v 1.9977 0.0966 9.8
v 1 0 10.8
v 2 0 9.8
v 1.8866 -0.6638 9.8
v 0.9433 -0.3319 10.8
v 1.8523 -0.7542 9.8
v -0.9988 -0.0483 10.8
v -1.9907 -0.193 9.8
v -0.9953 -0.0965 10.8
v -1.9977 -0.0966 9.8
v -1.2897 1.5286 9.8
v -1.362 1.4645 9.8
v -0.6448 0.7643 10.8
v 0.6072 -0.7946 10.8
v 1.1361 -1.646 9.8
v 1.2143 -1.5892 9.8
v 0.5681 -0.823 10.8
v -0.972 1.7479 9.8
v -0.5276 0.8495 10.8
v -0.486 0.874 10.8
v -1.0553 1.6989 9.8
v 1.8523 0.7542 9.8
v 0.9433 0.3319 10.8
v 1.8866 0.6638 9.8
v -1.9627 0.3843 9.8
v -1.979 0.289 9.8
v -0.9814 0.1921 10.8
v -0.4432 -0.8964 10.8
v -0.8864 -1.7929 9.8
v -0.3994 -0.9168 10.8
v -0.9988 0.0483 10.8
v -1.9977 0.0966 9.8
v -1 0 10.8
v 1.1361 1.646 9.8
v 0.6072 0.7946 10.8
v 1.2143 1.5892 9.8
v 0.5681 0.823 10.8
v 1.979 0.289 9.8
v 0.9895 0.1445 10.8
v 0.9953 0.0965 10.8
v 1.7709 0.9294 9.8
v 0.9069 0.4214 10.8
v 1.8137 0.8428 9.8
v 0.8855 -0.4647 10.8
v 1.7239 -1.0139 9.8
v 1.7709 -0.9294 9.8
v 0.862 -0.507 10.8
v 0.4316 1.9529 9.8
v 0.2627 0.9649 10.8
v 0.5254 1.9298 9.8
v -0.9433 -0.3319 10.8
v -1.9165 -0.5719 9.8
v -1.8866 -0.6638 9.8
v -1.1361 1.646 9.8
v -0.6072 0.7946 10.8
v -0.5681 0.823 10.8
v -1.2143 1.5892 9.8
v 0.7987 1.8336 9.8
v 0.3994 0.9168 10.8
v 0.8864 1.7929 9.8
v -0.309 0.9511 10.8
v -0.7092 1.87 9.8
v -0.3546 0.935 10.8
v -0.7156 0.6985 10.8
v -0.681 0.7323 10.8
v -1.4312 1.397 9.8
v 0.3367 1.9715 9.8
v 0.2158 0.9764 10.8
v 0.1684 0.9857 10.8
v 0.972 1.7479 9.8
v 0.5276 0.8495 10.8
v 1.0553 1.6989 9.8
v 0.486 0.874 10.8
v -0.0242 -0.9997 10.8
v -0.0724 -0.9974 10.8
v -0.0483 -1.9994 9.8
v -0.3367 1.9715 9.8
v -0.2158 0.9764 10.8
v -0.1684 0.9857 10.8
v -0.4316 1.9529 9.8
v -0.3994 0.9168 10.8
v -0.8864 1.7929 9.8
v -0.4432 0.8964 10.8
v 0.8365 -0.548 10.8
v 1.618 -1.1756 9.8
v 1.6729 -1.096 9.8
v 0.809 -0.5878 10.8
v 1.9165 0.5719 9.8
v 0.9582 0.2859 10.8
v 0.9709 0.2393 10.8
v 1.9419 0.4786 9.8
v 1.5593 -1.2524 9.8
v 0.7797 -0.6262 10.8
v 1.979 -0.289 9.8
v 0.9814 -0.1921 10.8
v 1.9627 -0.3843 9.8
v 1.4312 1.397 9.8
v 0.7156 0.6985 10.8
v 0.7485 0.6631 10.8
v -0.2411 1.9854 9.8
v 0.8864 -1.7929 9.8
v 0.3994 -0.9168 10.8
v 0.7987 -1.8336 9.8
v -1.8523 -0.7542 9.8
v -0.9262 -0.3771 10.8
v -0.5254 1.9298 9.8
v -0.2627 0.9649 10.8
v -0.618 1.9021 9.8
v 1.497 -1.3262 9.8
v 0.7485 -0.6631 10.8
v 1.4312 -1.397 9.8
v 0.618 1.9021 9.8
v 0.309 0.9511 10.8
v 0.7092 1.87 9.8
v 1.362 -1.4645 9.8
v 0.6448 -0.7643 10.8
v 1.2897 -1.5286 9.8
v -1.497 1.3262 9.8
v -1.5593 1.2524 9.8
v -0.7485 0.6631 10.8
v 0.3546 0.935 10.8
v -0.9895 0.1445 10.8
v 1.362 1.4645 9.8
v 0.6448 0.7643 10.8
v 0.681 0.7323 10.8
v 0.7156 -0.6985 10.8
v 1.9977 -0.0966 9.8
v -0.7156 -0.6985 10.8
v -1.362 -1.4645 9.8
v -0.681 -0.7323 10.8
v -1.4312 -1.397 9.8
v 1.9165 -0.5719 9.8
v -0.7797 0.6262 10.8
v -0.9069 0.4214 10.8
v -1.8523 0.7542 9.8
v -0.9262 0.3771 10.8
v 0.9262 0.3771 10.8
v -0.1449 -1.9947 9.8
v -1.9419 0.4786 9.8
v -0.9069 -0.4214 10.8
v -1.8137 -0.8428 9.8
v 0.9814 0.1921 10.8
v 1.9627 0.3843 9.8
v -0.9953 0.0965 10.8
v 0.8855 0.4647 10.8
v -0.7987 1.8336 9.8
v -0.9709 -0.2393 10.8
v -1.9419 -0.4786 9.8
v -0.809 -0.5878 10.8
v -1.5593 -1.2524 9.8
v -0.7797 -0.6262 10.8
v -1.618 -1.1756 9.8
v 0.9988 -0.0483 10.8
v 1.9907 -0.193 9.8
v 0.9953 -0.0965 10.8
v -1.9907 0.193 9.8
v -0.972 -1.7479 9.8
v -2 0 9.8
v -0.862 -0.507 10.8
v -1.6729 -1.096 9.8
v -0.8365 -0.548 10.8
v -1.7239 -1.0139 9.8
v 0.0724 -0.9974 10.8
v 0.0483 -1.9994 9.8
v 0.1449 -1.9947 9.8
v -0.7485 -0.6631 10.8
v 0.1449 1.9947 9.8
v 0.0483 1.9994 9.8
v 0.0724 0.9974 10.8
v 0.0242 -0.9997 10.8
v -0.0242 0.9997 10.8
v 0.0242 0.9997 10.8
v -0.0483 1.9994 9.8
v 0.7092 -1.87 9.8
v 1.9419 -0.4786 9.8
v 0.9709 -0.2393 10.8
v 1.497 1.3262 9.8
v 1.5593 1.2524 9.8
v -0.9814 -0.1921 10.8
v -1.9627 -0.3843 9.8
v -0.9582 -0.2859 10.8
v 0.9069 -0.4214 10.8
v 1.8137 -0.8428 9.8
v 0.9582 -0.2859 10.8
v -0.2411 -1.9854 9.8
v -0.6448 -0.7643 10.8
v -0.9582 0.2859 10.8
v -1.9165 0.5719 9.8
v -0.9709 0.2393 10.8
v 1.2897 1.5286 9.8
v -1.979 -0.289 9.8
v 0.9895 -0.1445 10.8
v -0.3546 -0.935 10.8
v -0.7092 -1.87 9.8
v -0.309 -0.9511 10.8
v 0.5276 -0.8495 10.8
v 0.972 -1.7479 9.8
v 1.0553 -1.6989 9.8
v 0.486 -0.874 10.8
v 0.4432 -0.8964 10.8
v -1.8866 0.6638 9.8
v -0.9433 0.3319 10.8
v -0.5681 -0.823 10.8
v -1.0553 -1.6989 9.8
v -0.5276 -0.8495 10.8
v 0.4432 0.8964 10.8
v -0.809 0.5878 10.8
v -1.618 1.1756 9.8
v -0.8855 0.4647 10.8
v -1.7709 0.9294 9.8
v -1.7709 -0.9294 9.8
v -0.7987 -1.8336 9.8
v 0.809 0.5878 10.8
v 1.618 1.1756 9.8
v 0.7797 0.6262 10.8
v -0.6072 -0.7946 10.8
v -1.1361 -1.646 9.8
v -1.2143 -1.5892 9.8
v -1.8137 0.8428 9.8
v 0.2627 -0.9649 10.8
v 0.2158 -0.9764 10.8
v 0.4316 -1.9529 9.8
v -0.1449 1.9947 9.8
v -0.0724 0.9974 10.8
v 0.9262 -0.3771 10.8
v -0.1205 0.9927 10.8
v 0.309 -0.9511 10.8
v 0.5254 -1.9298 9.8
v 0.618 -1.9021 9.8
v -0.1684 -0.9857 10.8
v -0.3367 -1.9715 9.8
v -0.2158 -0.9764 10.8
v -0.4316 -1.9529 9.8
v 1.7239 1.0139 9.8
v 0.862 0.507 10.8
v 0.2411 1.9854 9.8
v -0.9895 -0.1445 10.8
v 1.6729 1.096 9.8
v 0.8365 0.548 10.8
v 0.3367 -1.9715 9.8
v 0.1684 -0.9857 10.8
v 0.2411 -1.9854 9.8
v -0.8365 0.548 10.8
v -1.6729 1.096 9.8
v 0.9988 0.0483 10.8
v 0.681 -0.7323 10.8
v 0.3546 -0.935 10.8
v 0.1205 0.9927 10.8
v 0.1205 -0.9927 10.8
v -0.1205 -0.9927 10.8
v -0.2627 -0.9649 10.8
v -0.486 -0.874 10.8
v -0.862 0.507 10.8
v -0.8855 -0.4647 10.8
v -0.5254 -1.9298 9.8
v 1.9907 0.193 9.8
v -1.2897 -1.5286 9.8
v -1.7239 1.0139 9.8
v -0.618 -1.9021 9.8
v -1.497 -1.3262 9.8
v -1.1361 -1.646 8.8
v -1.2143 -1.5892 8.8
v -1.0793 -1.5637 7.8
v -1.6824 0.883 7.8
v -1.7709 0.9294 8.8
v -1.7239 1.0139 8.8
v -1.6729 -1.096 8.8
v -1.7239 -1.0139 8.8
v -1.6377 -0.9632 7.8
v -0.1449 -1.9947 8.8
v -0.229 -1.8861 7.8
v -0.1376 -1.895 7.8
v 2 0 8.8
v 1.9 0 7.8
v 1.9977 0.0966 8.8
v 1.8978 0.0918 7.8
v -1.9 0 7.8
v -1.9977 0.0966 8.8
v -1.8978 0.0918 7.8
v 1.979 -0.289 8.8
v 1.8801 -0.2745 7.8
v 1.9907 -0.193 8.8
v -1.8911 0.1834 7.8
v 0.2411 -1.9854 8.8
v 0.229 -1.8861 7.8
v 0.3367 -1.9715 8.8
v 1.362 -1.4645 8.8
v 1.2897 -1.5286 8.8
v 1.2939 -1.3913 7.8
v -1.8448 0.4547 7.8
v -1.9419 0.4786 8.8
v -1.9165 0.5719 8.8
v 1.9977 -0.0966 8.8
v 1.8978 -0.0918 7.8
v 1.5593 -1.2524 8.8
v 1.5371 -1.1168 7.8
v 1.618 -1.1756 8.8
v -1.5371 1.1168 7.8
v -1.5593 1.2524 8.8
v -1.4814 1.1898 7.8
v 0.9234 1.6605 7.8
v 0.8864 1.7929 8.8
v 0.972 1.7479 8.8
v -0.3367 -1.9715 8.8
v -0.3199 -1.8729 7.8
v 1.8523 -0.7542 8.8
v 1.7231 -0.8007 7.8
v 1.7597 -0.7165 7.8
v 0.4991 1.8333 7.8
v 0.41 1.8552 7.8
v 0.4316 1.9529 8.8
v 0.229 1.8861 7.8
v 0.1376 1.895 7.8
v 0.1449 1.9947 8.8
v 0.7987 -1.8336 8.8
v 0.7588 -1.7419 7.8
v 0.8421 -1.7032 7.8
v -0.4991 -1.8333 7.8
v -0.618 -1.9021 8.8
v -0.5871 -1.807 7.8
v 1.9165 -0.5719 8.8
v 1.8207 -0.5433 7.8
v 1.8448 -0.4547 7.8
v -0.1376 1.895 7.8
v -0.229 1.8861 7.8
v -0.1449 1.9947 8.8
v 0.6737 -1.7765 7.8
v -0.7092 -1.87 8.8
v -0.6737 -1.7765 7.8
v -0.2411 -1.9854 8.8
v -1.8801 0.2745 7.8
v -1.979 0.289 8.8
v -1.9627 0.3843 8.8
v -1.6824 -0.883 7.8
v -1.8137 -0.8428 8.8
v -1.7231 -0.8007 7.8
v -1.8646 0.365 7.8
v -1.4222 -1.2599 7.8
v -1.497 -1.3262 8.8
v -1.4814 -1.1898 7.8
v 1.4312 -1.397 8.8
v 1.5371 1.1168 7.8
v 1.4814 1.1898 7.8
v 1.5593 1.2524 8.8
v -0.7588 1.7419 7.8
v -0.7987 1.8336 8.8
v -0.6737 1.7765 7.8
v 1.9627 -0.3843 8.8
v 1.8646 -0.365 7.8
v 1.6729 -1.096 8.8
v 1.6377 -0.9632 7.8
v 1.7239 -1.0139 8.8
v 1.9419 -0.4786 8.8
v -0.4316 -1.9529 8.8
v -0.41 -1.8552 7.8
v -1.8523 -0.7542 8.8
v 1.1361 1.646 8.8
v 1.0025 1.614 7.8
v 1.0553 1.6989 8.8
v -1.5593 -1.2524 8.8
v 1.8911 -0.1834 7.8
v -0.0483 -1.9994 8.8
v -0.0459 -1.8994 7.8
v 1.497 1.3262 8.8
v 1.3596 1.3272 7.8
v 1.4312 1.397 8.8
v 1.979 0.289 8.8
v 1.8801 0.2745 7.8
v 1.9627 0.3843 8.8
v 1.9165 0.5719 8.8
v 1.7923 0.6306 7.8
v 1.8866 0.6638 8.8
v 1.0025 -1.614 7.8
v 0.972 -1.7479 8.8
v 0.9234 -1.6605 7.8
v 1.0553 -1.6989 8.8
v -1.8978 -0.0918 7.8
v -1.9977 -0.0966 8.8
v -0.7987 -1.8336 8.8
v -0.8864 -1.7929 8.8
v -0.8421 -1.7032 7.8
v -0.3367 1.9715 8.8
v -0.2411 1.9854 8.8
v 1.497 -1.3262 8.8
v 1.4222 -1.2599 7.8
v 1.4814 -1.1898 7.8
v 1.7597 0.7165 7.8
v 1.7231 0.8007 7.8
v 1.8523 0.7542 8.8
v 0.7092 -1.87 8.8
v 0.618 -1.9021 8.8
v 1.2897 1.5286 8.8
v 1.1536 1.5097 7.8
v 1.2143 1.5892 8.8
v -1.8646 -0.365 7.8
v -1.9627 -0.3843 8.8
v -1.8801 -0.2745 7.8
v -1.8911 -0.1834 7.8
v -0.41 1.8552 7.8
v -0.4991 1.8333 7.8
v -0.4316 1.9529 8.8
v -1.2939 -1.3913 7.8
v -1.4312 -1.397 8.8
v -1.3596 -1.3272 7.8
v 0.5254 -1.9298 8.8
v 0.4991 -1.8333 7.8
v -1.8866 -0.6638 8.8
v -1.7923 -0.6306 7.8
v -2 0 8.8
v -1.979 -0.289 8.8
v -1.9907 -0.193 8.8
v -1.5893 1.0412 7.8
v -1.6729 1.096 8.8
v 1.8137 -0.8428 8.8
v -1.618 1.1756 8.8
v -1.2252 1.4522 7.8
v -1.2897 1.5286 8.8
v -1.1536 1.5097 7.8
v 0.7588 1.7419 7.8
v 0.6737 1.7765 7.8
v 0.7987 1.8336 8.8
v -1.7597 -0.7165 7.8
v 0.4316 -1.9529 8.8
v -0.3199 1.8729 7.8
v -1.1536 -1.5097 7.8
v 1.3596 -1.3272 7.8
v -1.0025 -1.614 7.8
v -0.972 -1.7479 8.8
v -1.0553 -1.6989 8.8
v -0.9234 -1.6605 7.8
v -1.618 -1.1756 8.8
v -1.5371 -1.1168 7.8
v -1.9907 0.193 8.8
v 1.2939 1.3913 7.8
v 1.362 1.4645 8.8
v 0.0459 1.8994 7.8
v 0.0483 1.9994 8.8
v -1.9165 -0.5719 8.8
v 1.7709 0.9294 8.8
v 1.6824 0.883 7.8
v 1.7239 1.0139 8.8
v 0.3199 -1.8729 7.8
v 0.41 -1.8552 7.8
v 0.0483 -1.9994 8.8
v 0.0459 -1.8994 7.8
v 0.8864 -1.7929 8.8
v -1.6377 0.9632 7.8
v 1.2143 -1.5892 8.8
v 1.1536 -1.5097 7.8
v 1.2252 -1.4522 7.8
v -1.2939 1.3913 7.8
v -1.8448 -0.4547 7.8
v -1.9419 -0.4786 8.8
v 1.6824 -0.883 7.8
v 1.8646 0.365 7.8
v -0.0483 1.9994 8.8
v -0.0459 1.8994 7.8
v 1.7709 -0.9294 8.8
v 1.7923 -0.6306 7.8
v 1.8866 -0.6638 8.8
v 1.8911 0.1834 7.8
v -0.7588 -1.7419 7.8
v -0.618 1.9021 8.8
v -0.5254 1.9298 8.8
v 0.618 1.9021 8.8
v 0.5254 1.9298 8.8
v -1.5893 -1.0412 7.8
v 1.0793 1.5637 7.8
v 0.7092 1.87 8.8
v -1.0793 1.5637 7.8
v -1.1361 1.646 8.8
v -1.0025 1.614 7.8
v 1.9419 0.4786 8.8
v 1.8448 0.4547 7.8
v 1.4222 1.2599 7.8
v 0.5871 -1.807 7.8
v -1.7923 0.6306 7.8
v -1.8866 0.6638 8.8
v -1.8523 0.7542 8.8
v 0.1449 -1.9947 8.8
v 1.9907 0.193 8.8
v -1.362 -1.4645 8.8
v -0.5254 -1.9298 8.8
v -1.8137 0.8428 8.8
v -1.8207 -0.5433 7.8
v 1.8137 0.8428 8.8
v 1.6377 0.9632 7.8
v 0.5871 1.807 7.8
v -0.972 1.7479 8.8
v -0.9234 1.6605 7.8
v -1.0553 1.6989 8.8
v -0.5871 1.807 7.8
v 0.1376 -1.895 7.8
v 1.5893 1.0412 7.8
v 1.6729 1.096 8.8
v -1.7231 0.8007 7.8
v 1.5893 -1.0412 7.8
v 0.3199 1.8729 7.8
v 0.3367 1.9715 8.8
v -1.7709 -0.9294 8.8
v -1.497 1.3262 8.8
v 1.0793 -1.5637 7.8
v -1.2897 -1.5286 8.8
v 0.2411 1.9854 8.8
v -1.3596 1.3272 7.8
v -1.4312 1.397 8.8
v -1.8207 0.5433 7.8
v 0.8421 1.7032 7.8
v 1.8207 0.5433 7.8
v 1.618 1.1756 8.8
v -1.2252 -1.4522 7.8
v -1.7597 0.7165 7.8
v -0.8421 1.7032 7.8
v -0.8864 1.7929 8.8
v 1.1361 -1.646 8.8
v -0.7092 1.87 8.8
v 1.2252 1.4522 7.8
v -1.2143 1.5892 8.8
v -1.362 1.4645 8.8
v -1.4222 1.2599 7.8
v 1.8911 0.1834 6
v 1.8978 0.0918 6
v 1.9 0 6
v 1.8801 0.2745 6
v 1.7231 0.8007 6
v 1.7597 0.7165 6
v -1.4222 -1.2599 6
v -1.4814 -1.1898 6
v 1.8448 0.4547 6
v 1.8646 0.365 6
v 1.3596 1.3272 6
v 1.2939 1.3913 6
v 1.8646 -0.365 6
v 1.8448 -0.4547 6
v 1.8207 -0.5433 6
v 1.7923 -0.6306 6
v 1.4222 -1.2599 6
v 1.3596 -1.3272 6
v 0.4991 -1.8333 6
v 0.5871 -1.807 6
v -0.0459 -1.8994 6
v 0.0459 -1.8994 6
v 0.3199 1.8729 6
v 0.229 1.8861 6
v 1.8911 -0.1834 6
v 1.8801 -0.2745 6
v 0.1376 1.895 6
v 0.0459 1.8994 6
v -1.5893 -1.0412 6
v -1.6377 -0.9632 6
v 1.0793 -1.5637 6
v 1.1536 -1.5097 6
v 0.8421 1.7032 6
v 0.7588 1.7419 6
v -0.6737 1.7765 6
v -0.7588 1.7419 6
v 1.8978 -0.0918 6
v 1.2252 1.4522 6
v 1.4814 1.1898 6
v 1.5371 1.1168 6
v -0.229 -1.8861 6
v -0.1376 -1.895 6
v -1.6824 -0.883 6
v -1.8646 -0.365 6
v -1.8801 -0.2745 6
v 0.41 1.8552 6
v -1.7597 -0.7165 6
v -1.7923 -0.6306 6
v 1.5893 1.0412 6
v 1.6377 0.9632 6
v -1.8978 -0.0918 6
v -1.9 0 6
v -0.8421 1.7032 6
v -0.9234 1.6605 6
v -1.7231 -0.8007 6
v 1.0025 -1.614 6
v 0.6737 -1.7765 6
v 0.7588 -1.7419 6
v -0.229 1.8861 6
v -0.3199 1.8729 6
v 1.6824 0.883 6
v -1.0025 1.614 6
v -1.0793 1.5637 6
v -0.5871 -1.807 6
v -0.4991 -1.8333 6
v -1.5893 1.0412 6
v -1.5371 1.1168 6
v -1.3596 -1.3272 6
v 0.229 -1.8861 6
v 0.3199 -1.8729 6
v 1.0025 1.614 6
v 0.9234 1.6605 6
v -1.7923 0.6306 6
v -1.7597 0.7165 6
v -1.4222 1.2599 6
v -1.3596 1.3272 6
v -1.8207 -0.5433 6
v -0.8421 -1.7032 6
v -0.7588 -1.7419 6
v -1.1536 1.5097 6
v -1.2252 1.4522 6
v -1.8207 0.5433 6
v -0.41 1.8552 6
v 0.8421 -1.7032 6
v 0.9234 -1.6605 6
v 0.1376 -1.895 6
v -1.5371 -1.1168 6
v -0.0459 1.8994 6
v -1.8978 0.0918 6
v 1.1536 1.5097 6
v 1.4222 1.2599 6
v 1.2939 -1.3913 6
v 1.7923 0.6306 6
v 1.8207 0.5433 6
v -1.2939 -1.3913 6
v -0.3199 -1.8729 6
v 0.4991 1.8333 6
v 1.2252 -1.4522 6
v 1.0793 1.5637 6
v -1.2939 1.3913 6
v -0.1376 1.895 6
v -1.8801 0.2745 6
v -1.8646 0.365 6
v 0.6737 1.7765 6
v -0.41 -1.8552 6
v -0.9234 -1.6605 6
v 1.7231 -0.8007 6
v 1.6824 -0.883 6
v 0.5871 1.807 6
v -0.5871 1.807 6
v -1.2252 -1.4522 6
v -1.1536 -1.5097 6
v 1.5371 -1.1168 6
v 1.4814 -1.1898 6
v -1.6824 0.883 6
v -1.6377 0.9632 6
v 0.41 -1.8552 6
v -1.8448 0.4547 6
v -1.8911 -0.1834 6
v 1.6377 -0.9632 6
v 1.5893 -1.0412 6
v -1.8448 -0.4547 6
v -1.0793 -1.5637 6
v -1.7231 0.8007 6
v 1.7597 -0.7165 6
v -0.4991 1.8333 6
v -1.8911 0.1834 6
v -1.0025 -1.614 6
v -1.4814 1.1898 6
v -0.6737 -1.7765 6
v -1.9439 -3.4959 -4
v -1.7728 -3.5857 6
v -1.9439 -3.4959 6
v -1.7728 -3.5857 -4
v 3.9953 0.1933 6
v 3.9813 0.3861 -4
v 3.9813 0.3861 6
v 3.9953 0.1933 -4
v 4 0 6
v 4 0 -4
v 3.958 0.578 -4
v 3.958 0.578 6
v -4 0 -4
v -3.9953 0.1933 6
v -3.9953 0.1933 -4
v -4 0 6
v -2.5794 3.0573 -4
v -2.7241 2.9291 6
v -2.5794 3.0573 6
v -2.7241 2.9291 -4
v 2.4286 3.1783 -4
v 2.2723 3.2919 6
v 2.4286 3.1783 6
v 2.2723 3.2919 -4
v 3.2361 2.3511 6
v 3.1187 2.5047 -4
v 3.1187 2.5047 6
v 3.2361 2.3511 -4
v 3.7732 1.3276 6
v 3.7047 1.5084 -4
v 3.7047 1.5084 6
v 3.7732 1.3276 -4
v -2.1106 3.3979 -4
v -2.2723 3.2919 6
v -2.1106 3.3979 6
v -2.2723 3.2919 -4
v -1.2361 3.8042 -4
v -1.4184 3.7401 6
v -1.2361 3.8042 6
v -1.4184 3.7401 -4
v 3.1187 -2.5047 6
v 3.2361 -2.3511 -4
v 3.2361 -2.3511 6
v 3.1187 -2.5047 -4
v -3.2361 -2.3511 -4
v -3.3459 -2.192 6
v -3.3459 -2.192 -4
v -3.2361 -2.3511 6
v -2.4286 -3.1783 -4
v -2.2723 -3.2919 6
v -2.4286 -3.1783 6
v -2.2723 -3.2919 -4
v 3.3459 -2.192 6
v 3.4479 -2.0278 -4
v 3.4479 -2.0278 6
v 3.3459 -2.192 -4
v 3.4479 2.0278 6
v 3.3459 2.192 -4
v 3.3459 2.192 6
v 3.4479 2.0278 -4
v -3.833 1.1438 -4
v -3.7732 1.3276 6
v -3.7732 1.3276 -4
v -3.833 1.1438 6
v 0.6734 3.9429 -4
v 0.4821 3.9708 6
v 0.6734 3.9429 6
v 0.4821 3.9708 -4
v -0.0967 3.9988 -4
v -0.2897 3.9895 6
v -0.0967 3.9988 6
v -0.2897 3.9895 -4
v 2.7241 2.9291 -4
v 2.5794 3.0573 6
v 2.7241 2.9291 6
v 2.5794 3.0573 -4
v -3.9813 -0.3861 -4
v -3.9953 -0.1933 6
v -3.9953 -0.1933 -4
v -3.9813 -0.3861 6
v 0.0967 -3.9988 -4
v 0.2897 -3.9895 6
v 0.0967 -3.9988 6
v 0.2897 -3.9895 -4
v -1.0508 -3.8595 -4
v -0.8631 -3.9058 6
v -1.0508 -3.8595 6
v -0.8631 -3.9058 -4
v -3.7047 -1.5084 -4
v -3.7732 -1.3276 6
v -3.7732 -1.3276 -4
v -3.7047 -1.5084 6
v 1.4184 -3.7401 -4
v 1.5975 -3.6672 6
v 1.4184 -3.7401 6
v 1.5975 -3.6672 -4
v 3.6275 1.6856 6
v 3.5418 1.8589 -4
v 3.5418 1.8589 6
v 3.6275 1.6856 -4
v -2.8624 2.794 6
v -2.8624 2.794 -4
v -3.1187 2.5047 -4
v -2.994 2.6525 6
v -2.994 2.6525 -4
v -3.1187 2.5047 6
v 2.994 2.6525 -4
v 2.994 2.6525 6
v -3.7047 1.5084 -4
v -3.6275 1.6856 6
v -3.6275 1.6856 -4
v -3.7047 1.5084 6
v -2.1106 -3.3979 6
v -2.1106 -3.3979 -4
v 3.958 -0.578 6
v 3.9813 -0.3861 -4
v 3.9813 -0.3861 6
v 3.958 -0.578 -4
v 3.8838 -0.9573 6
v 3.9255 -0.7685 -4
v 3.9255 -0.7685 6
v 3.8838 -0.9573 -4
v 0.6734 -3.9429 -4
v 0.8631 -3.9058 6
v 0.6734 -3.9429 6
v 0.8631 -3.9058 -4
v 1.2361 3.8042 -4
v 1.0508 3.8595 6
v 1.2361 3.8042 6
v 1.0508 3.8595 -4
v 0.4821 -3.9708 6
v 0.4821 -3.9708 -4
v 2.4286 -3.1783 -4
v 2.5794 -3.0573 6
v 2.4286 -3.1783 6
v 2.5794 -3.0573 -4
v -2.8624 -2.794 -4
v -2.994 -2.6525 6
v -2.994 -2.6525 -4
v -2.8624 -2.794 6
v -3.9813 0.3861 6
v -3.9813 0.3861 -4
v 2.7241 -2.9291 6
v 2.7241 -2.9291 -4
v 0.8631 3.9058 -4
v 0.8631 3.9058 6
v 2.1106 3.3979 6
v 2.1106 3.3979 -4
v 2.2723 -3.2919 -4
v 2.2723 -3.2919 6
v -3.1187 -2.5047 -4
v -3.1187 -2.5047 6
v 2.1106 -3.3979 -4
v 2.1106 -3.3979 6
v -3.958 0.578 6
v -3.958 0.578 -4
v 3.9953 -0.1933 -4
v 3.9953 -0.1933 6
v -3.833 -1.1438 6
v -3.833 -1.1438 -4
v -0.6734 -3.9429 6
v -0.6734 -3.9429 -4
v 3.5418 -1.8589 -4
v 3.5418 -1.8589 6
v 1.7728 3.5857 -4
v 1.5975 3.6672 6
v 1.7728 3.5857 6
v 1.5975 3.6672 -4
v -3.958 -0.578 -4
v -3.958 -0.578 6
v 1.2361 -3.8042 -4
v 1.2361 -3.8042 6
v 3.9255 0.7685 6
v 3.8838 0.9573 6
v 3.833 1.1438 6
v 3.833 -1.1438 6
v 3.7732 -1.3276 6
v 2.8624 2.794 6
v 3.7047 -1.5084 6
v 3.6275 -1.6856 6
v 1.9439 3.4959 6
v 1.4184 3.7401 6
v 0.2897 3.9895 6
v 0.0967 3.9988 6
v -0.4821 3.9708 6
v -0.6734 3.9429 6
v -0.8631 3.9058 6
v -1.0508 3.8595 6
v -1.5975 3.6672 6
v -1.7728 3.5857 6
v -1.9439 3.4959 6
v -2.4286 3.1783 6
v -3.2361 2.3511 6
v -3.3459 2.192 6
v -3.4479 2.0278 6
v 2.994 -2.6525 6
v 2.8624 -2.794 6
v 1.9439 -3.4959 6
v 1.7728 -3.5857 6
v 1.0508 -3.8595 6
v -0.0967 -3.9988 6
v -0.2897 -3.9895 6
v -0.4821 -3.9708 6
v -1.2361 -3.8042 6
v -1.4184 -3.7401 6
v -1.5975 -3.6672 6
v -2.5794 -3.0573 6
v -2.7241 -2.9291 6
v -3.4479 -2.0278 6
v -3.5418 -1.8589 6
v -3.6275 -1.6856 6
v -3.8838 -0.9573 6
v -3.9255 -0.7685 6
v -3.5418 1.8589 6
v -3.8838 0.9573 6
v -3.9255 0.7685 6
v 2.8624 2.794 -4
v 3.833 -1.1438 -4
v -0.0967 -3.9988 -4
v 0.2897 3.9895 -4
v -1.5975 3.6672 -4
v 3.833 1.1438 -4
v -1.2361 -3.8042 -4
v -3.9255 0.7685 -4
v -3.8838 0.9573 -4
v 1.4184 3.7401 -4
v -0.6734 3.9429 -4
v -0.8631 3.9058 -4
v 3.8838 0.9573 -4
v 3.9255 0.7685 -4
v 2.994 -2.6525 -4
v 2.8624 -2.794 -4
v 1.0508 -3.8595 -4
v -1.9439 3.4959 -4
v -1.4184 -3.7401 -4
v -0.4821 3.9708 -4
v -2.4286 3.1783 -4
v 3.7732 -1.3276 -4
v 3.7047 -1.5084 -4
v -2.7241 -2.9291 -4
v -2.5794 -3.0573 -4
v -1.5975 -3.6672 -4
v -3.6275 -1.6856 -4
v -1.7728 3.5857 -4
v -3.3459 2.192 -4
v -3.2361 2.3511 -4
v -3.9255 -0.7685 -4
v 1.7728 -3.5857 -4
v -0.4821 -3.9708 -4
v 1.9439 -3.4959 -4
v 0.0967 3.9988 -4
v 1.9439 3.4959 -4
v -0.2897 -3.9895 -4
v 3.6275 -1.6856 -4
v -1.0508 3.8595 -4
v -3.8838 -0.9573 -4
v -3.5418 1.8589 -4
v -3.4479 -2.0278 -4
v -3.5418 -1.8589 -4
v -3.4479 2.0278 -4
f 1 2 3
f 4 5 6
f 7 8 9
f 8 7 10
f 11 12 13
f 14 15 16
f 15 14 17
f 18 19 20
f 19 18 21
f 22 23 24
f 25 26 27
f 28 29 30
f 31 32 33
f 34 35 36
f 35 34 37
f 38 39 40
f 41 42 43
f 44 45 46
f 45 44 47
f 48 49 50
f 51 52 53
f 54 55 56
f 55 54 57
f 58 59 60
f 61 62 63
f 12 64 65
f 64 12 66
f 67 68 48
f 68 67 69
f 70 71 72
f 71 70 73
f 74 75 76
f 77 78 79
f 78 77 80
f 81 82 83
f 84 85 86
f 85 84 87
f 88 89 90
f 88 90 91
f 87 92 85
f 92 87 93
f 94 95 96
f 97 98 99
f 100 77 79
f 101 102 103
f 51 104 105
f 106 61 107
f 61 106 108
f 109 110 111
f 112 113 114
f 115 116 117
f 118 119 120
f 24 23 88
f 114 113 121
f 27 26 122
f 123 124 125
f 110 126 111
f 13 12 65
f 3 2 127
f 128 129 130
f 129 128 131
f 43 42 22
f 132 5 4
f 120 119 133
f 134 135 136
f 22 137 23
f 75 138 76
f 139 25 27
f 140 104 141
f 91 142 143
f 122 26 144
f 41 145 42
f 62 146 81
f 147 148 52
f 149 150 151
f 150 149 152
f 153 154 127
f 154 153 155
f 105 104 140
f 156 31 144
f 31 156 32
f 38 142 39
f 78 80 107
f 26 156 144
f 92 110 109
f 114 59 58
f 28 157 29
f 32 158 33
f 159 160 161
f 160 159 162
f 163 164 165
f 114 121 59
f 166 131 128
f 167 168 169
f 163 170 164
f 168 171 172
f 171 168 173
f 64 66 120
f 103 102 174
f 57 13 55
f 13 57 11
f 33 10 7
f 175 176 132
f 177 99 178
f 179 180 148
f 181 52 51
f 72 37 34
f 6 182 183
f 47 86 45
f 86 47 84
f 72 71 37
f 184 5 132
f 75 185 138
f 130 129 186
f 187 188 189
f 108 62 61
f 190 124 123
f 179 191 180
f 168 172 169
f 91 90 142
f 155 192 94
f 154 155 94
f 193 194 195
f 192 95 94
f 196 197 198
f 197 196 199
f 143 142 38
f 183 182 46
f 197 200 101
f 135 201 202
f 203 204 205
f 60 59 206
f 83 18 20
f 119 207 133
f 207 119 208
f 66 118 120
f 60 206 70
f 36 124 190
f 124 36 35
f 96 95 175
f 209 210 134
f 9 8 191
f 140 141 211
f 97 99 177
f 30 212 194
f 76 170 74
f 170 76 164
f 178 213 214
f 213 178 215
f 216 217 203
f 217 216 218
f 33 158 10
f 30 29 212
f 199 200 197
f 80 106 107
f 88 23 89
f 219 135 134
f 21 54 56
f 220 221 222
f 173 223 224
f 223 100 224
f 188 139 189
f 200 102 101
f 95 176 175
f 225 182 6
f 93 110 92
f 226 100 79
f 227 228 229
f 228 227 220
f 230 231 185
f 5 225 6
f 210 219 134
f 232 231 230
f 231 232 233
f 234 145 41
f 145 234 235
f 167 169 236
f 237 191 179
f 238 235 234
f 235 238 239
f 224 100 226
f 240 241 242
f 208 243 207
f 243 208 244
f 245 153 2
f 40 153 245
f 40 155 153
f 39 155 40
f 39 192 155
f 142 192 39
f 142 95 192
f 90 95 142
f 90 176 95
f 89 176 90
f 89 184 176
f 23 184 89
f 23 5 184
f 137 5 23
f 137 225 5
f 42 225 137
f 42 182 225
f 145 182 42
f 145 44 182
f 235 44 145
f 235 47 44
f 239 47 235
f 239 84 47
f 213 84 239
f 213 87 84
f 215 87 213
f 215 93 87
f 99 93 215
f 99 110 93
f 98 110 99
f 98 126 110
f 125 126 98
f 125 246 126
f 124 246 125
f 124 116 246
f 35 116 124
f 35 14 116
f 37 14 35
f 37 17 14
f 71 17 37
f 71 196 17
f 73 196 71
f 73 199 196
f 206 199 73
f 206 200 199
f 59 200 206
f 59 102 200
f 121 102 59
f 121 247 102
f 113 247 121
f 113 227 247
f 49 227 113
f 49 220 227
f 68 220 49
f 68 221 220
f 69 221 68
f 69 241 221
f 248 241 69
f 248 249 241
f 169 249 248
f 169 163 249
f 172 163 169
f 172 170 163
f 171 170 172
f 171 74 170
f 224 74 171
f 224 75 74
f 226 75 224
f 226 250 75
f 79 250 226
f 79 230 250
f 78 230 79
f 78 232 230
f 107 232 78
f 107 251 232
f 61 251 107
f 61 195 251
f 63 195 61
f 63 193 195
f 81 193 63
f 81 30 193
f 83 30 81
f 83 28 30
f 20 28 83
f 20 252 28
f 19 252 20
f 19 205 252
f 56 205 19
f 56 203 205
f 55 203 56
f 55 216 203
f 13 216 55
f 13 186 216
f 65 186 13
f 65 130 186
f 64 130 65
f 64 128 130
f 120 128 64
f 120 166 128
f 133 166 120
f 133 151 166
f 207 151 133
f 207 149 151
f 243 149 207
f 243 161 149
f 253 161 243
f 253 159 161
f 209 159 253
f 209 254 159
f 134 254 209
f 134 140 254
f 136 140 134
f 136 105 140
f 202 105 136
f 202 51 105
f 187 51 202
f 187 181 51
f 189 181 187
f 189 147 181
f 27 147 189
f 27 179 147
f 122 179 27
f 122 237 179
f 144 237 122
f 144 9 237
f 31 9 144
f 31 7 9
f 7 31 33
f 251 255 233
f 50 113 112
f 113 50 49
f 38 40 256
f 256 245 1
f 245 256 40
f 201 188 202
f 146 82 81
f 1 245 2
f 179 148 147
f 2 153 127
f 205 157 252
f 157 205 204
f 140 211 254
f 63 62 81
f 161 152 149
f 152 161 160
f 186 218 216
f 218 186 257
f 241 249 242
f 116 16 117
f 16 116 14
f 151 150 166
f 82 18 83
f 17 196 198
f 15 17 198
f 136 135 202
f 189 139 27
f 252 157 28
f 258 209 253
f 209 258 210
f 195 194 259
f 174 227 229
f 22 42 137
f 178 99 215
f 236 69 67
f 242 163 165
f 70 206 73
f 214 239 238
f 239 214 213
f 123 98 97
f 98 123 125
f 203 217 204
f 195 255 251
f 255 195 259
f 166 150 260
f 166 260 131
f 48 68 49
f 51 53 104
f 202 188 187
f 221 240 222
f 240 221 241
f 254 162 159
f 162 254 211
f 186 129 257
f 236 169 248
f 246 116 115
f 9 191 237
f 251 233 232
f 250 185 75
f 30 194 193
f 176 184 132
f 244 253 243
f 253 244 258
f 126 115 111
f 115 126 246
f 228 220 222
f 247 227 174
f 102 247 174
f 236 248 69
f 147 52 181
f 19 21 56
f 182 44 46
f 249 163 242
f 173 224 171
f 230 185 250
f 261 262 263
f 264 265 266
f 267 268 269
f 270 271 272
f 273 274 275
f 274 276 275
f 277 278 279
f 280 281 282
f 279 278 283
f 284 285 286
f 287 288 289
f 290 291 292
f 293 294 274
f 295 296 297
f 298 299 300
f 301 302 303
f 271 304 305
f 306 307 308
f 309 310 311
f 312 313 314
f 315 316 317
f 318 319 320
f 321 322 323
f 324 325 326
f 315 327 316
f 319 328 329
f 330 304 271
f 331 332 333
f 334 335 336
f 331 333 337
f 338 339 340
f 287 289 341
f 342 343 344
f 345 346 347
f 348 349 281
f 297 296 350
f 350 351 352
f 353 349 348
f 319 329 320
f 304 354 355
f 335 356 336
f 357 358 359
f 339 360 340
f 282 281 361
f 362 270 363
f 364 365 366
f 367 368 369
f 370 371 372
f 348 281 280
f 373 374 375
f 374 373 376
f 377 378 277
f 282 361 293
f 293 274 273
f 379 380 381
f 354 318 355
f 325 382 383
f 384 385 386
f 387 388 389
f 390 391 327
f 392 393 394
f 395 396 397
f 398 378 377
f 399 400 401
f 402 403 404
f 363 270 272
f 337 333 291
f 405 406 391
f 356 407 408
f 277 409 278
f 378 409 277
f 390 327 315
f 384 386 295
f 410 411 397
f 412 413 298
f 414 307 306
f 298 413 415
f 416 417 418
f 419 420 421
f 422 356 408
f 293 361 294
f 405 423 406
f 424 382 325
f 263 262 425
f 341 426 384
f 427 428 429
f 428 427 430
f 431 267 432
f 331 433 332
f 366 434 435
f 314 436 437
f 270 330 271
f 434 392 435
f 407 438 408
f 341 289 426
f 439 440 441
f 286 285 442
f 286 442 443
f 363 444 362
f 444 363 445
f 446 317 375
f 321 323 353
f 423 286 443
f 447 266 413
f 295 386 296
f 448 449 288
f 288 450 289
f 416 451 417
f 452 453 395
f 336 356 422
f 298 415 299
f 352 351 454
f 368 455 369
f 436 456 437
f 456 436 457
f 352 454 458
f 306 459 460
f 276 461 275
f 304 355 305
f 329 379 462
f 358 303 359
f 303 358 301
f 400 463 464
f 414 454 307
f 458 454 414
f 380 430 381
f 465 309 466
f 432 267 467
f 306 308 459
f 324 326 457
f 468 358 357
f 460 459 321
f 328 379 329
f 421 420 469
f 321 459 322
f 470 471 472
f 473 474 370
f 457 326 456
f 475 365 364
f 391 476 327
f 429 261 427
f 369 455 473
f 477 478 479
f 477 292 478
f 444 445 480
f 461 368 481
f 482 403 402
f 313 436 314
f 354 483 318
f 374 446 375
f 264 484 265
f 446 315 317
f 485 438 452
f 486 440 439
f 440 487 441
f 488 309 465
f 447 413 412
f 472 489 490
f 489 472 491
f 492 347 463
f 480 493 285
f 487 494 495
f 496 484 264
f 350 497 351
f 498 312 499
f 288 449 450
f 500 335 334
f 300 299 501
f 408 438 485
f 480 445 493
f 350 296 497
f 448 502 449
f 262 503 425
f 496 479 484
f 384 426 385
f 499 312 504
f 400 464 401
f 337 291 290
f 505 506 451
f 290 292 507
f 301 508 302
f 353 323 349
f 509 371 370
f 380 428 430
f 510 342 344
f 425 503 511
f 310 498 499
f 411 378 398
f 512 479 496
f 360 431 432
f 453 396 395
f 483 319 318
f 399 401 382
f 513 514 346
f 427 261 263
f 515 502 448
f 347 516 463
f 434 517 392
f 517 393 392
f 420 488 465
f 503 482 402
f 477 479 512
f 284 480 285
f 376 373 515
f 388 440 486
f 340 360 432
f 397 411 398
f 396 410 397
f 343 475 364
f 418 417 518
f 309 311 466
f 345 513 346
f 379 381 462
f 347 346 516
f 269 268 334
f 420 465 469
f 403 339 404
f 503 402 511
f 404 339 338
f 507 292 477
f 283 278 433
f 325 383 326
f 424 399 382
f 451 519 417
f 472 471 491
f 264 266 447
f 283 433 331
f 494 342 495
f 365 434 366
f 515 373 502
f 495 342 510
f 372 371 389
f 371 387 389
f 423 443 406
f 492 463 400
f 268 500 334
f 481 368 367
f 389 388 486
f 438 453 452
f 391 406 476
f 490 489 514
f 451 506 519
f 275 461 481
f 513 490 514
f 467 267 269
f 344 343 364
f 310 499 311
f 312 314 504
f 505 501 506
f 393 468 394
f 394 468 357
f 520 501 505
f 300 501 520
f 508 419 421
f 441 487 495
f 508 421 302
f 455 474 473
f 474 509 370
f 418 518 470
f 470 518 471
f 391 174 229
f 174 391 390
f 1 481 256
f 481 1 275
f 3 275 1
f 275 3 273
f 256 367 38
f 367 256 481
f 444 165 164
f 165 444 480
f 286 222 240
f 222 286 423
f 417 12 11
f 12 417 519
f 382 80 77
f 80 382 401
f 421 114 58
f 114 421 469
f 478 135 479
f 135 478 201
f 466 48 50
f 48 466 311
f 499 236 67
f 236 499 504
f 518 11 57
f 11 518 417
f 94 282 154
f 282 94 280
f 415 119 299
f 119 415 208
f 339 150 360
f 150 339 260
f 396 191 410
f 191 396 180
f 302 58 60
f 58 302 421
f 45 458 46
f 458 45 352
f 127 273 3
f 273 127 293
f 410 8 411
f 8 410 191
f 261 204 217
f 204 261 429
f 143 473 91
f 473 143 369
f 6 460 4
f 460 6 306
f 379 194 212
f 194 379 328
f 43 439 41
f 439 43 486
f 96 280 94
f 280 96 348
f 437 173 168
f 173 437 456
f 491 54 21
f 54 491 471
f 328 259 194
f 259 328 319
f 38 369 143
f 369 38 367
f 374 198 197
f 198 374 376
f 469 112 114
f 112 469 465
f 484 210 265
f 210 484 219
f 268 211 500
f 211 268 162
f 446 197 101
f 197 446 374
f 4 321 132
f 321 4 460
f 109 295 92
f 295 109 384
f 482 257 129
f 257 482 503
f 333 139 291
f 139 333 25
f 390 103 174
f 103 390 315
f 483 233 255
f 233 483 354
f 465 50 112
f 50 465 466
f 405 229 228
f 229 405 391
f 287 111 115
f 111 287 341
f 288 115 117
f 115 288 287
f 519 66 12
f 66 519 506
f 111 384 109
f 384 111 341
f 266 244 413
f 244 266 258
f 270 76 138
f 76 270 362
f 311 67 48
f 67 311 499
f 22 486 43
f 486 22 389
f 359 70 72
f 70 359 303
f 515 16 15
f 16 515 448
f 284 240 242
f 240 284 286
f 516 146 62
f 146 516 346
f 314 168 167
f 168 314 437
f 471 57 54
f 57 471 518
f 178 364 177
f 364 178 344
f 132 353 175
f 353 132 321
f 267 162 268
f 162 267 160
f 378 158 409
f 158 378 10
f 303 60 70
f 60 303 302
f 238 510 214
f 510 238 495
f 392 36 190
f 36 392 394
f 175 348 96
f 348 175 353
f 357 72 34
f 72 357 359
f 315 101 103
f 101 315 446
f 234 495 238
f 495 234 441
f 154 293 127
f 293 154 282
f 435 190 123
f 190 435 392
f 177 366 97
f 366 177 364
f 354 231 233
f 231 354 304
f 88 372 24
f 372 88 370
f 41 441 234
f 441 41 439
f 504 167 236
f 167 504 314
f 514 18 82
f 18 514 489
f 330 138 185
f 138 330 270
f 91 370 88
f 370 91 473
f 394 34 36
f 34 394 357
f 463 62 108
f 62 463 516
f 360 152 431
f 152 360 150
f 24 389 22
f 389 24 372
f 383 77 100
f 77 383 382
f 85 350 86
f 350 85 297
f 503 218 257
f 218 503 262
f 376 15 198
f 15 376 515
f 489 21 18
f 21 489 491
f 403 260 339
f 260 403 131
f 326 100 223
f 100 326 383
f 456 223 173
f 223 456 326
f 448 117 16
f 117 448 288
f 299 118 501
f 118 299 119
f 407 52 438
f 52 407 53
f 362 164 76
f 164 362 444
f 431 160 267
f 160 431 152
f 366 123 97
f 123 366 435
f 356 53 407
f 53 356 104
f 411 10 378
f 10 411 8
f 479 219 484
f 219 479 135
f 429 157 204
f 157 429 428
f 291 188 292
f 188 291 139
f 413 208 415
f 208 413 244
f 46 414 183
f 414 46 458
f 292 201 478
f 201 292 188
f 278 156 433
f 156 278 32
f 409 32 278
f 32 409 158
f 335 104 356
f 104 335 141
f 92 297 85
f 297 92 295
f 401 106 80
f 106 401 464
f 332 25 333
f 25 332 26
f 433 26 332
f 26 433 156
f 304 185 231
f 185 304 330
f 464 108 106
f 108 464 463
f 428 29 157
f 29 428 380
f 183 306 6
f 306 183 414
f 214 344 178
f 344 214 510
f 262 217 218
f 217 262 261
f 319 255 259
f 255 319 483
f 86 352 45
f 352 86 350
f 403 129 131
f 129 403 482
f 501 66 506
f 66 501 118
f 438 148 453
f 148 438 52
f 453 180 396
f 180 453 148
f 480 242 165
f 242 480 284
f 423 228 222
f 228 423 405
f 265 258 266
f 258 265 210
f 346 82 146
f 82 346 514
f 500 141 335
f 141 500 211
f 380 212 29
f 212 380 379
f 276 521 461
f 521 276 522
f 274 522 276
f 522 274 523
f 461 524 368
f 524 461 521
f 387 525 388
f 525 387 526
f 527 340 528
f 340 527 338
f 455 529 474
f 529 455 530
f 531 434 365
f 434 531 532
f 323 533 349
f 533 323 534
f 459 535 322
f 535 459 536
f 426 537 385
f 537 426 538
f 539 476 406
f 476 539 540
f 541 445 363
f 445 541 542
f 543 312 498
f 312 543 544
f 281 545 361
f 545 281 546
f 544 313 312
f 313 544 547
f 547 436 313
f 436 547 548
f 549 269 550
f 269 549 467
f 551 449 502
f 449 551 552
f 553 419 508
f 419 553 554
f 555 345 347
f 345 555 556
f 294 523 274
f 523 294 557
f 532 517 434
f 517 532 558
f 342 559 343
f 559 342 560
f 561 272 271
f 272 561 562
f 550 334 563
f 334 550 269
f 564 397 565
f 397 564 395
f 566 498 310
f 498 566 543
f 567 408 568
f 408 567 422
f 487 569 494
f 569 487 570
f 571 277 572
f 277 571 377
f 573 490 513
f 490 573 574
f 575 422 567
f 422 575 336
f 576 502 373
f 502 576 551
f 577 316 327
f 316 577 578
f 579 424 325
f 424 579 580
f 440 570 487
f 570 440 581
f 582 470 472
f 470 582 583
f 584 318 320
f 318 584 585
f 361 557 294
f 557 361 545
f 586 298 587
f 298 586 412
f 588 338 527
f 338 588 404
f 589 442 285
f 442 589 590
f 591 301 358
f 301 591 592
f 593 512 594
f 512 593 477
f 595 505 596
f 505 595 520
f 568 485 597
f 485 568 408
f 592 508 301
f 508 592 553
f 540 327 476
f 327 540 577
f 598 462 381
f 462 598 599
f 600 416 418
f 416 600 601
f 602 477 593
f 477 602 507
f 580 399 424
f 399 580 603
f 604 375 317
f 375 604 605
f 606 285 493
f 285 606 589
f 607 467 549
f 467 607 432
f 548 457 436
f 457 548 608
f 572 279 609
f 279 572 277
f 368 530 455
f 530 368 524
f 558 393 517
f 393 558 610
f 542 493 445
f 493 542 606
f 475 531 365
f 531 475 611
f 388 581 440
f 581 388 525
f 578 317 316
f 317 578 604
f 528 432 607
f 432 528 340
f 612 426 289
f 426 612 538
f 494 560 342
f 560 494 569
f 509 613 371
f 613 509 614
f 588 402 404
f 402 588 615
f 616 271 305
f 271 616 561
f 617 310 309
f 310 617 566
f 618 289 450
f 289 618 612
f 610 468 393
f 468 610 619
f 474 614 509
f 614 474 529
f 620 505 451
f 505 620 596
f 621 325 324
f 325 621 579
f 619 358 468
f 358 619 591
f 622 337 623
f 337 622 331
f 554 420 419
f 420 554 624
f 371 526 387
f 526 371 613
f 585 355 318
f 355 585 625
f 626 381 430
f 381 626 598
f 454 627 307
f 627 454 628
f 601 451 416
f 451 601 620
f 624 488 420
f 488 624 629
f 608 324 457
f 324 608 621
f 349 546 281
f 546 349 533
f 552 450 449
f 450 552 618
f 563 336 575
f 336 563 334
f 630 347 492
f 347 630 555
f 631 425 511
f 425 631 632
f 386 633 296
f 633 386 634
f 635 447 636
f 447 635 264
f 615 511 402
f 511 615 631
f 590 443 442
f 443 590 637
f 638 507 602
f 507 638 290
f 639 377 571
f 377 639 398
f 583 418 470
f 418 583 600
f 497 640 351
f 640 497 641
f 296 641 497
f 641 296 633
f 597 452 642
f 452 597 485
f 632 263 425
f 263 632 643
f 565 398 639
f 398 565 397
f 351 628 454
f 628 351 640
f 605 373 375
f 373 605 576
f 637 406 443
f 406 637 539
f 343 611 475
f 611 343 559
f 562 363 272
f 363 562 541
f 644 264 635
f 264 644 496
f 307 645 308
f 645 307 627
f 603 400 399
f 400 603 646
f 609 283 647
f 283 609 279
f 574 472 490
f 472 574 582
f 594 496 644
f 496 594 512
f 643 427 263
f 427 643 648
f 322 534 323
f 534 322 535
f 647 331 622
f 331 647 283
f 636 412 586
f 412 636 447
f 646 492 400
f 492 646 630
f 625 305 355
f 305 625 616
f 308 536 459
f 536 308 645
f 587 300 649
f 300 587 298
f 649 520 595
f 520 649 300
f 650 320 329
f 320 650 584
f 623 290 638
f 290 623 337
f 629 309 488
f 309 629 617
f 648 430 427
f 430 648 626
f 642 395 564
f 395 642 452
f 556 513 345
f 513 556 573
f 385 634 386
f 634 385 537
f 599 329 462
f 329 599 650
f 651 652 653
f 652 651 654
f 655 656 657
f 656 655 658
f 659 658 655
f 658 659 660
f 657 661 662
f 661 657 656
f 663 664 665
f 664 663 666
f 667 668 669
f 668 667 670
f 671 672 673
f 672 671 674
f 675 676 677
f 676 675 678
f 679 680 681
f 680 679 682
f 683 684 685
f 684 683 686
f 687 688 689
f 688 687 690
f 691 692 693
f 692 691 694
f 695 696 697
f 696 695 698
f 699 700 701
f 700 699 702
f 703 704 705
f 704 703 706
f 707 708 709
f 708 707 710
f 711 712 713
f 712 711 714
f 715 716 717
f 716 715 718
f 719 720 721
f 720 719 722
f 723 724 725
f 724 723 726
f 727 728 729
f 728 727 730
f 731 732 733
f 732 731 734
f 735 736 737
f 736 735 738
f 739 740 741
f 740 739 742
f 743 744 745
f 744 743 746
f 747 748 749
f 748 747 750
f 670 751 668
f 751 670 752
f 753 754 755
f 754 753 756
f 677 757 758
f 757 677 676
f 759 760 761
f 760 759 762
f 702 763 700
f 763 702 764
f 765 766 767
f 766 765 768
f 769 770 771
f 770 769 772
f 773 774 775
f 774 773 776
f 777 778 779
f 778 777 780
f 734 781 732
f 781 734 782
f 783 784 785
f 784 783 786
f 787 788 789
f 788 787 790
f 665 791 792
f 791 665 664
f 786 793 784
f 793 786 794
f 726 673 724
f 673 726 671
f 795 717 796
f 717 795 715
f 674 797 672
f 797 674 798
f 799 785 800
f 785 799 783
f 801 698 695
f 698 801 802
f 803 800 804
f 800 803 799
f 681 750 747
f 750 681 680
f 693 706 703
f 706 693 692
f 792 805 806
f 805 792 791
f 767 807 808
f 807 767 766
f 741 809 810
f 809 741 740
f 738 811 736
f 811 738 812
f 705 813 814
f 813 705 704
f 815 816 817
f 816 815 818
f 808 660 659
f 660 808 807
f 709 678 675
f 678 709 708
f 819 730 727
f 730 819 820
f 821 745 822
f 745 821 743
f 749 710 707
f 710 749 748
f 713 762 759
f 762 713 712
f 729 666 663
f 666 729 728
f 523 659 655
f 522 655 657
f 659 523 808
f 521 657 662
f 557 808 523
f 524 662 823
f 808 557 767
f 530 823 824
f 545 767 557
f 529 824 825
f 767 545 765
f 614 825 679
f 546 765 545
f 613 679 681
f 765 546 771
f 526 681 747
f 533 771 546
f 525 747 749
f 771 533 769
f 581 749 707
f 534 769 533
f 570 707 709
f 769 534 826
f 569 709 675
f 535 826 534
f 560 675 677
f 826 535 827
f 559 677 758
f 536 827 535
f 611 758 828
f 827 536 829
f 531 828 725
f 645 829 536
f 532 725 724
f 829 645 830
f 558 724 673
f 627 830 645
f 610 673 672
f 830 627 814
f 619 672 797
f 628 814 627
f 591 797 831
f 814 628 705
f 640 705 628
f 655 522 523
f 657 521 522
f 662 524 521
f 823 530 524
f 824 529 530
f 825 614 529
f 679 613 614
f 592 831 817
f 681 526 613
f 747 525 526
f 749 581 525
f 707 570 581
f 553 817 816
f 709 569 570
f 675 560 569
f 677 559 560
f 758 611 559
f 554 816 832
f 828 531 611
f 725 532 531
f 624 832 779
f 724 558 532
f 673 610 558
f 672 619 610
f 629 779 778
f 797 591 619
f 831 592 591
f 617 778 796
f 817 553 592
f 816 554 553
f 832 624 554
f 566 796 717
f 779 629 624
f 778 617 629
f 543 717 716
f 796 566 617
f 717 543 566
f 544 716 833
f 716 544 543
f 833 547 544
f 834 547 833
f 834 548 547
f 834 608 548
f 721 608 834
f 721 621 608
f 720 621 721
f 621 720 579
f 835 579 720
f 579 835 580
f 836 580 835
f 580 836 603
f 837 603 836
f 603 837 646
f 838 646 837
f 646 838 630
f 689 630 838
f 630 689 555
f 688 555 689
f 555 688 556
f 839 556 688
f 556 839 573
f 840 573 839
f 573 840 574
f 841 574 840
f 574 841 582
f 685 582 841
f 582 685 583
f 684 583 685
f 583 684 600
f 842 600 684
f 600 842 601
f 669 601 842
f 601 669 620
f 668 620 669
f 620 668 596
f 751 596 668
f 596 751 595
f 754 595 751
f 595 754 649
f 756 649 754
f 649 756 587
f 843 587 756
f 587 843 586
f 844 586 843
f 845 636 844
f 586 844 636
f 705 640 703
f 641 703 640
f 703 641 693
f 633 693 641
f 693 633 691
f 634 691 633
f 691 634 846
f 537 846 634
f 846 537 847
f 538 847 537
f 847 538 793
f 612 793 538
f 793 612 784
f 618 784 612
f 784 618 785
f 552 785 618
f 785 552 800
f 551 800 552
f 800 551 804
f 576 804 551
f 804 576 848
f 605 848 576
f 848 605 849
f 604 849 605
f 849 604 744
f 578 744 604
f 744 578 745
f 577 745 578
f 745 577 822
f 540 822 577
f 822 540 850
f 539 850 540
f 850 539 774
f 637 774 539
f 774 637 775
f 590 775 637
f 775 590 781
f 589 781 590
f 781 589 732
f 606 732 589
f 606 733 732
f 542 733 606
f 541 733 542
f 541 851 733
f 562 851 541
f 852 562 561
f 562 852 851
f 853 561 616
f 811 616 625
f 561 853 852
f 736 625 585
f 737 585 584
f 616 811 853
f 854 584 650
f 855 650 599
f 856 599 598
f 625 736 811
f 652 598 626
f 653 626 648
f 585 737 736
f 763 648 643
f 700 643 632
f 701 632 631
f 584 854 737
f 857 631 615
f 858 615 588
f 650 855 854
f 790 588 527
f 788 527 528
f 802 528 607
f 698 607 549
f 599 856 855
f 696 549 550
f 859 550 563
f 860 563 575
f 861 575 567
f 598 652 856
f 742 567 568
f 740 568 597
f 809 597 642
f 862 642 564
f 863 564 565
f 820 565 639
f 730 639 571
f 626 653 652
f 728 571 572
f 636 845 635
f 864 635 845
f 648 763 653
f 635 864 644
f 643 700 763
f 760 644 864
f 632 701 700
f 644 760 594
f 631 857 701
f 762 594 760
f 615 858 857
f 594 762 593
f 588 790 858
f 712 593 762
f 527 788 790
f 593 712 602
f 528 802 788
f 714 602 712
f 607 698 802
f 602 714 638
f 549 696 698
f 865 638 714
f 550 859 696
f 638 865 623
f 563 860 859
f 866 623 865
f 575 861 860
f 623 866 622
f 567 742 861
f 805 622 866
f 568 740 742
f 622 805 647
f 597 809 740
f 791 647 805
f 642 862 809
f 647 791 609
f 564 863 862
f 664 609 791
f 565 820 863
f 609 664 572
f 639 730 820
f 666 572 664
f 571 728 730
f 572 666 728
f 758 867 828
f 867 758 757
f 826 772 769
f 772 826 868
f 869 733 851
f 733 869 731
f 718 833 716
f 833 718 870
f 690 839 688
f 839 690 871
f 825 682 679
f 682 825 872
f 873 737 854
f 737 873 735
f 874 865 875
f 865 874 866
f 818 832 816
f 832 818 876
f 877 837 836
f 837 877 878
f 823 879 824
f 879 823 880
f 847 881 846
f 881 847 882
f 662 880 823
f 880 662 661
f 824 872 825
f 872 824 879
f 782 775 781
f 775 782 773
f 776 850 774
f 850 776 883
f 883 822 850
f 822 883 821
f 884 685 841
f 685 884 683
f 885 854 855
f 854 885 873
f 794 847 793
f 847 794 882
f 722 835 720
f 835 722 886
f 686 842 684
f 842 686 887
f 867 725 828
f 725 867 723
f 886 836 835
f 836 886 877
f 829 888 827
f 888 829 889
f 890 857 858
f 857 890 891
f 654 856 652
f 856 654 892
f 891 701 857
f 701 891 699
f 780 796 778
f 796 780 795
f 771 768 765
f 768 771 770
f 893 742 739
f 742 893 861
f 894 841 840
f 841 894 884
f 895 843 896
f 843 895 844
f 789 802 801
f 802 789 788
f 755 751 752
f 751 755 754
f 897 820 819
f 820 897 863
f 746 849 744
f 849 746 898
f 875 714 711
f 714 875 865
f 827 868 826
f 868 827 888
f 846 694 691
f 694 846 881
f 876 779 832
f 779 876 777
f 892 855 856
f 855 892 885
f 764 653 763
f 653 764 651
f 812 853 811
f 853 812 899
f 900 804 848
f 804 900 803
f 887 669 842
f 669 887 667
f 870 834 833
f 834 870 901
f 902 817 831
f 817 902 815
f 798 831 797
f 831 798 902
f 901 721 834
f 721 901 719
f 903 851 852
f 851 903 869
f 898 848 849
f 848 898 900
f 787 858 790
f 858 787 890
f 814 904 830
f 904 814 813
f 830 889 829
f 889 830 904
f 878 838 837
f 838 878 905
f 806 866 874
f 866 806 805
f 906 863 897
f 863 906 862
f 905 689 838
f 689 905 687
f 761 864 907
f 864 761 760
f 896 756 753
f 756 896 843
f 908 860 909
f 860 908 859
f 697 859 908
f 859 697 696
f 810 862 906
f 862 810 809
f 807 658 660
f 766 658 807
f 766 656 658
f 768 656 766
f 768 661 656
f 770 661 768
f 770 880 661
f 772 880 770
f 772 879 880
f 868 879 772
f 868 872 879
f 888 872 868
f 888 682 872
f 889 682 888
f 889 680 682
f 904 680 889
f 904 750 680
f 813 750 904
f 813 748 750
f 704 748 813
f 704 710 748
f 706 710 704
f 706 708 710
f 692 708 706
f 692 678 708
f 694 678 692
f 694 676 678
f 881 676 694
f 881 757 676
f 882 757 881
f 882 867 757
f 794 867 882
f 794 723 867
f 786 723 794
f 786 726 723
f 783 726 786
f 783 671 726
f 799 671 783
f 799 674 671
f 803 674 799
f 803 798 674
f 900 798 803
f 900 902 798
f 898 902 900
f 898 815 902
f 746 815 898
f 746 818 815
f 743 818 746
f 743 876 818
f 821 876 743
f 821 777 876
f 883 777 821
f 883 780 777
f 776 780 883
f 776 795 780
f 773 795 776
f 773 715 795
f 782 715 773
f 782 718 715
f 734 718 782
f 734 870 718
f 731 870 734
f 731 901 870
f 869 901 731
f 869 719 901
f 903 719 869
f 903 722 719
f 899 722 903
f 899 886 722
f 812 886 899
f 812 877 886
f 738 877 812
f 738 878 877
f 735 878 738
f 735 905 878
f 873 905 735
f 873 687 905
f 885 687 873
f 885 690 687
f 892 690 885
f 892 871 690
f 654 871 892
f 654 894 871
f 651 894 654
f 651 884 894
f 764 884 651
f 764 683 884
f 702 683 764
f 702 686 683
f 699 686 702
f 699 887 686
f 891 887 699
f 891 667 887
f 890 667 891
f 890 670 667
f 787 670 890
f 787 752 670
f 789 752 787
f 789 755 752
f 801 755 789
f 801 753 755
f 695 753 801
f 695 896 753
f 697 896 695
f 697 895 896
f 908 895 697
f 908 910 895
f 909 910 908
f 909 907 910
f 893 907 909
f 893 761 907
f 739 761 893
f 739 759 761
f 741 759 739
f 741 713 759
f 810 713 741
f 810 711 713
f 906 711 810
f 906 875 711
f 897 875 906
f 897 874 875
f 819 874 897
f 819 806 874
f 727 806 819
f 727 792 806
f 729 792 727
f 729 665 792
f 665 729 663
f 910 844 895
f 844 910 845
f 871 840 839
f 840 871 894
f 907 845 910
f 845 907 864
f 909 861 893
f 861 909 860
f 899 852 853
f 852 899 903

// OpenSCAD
$fn=130;

D_sock=8;    //Sockeldurchmesser
D_knub=4; //Knubbeldurchmesser
H_sock=10;   //Sockelhöhe
H_knub=10.5; //Knubbelhöhe 10 = Knuppelsockel=1.3mm
S_knub=0.2;  //Schaftdurchmesser=Knubbeldurchmesser-S_knub

//Sockel
H=H_sock-6;
color("SlateGray")
//color("WhiteSmoke")
translate([0,0,H*-1])
cylinder (h=H_sock, d=D_sock);

difference(){

//Knubbl
//color("SlateGray")
color("WhiteSmoke")    

union(){

translate([0,0,H_knub-0.7])
cylinder (h=1, d1=D_knub, d2=D_knub-2);

translate([0,0,H_knub-2.7])
cylinder (h=1, d1=D_knub-S_knub, d2=D_knub);

translate([0,0,H_knub-1.7])
cylinder (h=1, d1=D_knub, d2=D_knub);

//Schaft
translate([0,0,5.3])
cylinder (h=2.5, d=D_knub-S_knub);   
}

/*
//Einschnitt
translate([-0.4,-2.5,6.3])
 cube([0.5,5,7]);
*/
}

//Knuppel-Shaft messen V3 Höhe = 1.3mm
//translate([2,-3,6])
// cube([1.7,5,1.7]);
